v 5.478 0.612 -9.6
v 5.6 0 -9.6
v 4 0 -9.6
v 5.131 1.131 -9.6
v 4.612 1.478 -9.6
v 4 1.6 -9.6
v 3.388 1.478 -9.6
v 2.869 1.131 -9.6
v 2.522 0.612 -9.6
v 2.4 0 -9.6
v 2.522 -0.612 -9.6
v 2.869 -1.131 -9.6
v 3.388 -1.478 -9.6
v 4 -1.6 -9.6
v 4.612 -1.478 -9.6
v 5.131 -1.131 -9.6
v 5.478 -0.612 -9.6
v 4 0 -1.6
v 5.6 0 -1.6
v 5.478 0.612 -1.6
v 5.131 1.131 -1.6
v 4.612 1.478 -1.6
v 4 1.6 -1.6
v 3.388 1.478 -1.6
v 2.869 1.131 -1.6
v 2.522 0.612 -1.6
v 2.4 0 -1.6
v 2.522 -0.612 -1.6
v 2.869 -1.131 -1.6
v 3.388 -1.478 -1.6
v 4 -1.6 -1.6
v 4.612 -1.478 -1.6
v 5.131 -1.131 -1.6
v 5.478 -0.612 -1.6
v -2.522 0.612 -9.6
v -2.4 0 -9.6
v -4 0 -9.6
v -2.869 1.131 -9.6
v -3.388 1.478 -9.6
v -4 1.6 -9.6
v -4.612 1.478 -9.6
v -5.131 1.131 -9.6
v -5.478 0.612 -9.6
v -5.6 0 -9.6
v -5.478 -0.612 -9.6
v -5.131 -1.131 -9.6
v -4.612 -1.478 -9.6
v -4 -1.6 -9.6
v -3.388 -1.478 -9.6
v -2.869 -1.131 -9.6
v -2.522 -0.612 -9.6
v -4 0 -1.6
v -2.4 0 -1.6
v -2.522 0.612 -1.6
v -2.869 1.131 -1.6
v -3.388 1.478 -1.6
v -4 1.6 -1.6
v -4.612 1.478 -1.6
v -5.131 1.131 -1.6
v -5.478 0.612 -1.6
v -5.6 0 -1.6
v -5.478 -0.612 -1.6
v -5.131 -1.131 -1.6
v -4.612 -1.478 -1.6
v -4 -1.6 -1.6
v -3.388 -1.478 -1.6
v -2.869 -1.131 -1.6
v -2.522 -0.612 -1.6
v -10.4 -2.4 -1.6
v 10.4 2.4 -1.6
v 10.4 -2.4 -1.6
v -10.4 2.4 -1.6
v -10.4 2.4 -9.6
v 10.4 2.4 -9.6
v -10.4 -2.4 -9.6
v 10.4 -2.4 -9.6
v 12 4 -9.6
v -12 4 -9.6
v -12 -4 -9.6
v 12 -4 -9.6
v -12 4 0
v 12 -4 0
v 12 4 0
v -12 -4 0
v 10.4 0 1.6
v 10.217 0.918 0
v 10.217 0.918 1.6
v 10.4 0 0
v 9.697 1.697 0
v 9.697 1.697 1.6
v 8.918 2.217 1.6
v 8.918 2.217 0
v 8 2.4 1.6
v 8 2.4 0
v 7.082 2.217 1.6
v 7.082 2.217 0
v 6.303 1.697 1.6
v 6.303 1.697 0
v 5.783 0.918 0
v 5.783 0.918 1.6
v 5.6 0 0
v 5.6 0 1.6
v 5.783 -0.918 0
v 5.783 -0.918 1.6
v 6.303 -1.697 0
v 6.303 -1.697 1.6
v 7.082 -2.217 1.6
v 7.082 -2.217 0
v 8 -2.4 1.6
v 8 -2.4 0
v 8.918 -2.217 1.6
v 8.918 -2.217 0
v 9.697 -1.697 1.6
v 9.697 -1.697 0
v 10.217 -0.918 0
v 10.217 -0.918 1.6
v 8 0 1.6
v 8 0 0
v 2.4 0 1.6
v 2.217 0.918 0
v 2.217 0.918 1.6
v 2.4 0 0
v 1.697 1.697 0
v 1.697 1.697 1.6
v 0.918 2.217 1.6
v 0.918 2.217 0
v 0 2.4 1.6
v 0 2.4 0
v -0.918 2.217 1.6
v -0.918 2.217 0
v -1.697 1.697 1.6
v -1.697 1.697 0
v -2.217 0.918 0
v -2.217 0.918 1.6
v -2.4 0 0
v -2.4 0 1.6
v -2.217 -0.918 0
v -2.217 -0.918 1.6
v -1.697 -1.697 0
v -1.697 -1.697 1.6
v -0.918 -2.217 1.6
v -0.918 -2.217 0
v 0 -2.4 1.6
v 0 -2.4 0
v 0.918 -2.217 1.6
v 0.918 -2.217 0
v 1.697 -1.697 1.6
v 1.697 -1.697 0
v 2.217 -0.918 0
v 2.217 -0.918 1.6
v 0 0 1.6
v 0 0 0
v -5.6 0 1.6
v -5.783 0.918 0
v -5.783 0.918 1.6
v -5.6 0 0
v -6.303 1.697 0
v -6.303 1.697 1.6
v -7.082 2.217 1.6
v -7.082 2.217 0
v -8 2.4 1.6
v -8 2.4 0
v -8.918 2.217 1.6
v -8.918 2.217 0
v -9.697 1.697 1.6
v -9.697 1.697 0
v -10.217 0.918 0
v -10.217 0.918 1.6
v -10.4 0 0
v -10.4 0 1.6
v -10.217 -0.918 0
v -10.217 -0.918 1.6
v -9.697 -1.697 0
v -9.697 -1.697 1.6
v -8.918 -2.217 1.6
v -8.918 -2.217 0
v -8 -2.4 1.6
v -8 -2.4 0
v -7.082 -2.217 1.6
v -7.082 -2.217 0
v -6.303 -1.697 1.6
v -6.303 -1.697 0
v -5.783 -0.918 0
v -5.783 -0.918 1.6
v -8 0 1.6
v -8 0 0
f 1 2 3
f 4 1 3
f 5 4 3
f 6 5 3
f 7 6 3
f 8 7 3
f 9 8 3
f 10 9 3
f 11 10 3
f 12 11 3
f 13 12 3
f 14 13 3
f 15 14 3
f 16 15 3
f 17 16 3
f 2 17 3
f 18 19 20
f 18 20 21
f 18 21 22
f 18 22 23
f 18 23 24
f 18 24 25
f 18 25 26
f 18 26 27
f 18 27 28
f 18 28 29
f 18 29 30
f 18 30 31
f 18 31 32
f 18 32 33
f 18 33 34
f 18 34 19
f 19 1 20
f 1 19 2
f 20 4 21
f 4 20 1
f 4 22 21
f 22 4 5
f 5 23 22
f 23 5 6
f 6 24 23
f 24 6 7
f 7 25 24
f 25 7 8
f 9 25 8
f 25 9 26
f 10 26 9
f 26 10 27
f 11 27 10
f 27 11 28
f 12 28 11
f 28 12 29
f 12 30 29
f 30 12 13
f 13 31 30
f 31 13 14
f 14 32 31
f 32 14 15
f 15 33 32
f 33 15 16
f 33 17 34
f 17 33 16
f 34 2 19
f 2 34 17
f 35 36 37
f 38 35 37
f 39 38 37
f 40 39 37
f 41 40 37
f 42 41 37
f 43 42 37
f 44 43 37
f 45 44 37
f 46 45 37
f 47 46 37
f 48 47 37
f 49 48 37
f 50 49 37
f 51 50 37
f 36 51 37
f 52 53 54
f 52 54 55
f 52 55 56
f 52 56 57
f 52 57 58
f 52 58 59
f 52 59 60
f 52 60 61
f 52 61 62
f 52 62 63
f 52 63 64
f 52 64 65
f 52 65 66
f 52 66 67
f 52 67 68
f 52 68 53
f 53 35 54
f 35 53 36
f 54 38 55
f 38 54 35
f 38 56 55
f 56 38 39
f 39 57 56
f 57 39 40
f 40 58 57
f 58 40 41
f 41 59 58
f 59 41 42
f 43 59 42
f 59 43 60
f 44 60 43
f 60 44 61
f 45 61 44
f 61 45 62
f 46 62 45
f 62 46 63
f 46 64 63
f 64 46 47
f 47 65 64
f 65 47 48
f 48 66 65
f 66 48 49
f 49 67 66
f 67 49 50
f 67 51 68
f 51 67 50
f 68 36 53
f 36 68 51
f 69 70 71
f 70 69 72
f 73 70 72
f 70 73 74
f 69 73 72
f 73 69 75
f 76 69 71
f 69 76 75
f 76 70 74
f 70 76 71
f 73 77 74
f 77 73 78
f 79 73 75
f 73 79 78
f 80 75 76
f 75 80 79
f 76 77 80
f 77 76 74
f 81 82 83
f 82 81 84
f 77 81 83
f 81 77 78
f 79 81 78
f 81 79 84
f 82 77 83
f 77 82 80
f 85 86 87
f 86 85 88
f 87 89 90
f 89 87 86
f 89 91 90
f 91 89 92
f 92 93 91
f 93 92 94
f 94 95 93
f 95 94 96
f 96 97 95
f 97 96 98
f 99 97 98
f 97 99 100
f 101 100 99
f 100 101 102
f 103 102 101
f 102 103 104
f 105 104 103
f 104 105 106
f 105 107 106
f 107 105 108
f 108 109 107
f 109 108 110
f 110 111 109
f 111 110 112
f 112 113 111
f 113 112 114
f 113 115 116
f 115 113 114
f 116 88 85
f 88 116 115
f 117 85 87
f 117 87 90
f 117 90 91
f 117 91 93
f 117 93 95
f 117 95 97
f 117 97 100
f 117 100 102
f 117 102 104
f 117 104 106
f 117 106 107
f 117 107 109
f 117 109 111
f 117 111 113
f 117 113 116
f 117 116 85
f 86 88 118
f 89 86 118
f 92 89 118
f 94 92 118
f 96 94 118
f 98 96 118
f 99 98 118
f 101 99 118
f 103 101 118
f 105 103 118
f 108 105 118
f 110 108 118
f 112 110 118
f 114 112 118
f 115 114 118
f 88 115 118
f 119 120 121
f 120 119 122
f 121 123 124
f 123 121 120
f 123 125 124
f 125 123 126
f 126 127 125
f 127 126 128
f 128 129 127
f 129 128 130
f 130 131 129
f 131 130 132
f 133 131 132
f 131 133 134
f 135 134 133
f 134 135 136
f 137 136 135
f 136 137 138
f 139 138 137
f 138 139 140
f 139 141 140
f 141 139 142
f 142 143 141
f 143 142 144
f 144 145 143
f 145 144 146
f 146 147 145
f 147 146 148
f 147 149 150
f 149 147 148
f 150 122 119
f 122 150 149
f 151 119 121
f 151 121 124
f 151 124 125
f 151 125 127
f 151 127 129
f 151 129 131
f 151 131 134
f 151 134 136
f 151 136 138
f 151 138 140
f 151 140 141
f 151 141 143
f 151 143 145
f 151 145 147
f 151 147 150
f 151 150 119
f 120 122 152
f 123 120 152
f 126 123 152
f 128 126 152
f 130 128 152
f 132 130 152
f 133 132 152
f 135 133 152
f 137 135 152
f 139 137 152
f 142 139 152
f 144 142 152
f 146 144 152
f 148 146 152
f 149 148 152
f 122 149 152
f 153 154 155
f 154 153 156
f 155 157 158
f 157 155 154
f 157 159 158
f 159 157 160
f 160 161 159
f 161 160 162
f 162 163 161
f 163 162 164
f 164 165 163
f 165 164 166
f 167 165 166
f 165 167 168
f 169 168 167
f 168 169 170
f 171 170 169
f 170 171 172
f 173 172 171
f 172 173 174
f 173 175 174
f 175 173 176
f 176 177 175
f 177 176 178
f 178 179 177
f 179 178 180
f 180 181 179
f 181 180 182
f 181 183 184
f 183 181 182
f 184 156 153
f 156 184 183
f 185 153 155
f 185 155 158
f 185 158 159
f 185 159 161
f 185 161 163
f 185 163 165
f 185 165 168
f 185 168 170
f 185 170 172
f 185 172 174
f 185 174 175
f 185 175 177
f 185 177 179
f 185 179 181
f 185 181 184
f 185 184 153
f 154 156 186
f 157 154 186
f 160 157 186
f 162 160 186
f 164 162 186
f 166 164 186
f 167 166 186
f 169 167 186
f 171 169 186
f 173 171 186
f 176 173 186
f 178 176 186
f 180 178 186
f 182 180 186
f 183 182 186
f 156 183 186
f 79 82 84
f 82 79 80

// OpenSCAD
// file: ../p/4-4edge.scad
use <../lib.scad>
function ldraw_lib__4_4edge() = [
// 0 Circle 1.0
// 0 Name: 4-4edge.dat
// 0 Author: James Jessiman
// 0 !LDRAW_ORG Primitive UPDATE 2017-01
// 0 !LICENSE Licensed under CC BY 2.0 and CC BY 4.0 : see CAreadme.txt
// 
// 0 BFC CERTIFY CCW
  [0,"BFC","CERTIFY"],
  [0,"BFC","CCW"],
// 
// 0 !HISTORY 1998-12-15 [PTadmin] Official Update 1998-10
// 0 !HISTORY 2005-12-28 [PTadmin] Official Update 2005-01
// 0 !HISTORY 2007-06-24 [PTadmin] Header formatted for Contributor Agreement
// 0 !HISTORY 2008-07-01 [PTadmin] Official Update 2008-01
// 0 !HISTORY 2017-01-15 [Steffen] BFCed
// 0 !HISTORY 2017-12-30 [PTadmin] Official Update 2017-01
// 
// 
// 2 24 1 0 0 0.9239 0 0.3827
  [2,24,1,0,0,0.9239,0,0.3827],
// 2 24 0.9239 0 0.3827 0.7071 0 0.7071
  [2,24,0.9239,0,0.3827,0.7071,0,0.7071],
// 2 24 0.7071 0 0.7071 0.3827 0 0.9239
  [2,24,0.7071,0,0.7071,0.3827,0,0.9239],
// 2 24 0.3827 0 0.9239 0 0 1
  [2,24,0.3827,0,0.9239,0,0,1],
// 2 24 0 0 1 -0.3827 0 0.9239
  [2,24,0,0,1,-0.3827,0,0.9239],
// 2 24 -0.3827 0 0.9239 -0.7071 0 0.7071
  [2,24,-0.3827,0,0.9239,-0.7071,0,0.7071],
// 2 24 -0.7071 0 0.7071 -0.9239 0 0.3827
  [2,24,-0.7071,0,0.7071,-0.9239,0,0.3827],
// 2 24 -0.9239 0 0.3827 -1 0 -0
  [2,24,-0.9239,0,0.3827,-1,0,-0],
// 2 24 -1 0 -0 -0.9239 0 -0.3827
  [2,24,-1,0,-0,-0.9239,0,-0.3827],
// 2 24 -0.9239 0 -0.3827 -0.7071 0 -0.7071
  [2,24,-0.9239,0,-0.3827,-0.7071,0,-0.7071],
// 2 24 -0.7071 0 -0.7071 -0.3827 0 -0.9239
  [2,24,-0.7071,0,-0.7071,-0.3827,0,-0.9239],
// 2 24 -0.3827 0 -0.9239 0 0 -1
  [2,24,-0.3827,0,-0.9239,0,0,-1],
// 2 24 0 0 -1 0.3827 0 -0.9239
  [2,24,0,0,-1,0.3827,0,-0.9239],
// 2 24 0.3827 0 -0.9239 0.7071 0 -0.7071
  [2,24,0.3827,0,-0.9239,0.7071,0,-0.7071],
// 2 24 0.7071 0 -0.7071 0.9239 0 -0.3827
  [2,24,0.7071,0,-0.7071,0.9239,0,-0.3827],
// 2 24 0.9239 0 -0.3827 1 0 0
  [2,24,0.9239,0,-0.3827,1,0,0],
];
module ldraw_lib__4_4edge(step=0, col=false, unit=2/5, alt=false, line=0.2, solid=!$preview)
    makepoly(ldraw_lib__4_4edge(), step=step, col=col, unit=unit, alt=alt, line=line, solid=solid);
ldraw_lib__4_4edge(line=0.2);
// file: ../p/4-4disc.scad
use <../lib.scad>
function ldraw_lib__4_4disc() = [
// 0 Disc 1.0
// 0 Name: 4-4disc.dat
// 0 Author: James Jessiman
// 0 !LDRAW_ORG Primitive UPDATE 2002-02
// 0 !LICENSE Licensed under CC BY 2.0 and CC BY 4.0 : see CAreadme.txt
// 
// 0 BFC CERTIFY CCW
  [0,"BFC","CERTIFY"],
  [0,"BFC","CCW"],
// 
// 0 !HISTORY 1998-12-15 [PTadmin] Official Update 1998-10
// 0 !HISTORY 2002-03-23 [sbliss] Added BFC statement
// 0 !HISTORY 2002-04-25 [PTadmin] Official Update 2002-02
// 0 !HISTORY 2007-06-24 [PTadmin] Header formatted for Contributor Agreement
// 0 !HISTORY 2008-07-01 [PTadmin] Official Update 2008-01
// 
// 
// 3 16 0 0 0 1 0 0 0.9239 0 0.3827
  [3,16,0,0,0,1,0,0,0.9239,0,0.3827],
// 3 16 0 0 0 0.9239 0 0.3827 0.7071 0 0.7071
  [3,16,0,0,0,0.9239,0,0.3827,0.7071,0,0.7071],
// 3 16 0 0 0 0.7071 0 0.7071 0.3827 0 0.9239
  [3,16,0,0,0,0.7071,0,0.7071,0.3827,0,0.9239],
// 3 16 0 0 0 0.3827 0 0.9239 0 0 1
  [3,16,0,0,0,0.3827,0,0.9239,0,0,1],
// 3 16 0 0 0 0 0 1 -0.3827 0 0.9239
  [3,16,0,0,0,0,0,1,-0.3827,0,0.9239],
// 3 16 0 0 0 -0.3827 0 0.9239 -0.7071 0 0.7071
  [3,16,0,0,0,-0.3827,0,0.9239,-0.7071,0,0.7071],
// 3 16 0 0 0 -0.7071 0 0.7071 -0.9239 0 0.3827
  [3,16,0,0,0,-0.7071,0,0.7071,-0.9239,0,0.3827],
// 3 16 0 0 0 -0.9239 0 0.3827 -1 0 -0
  [3,16,0,0,0,-0.9239,0,0.3827,-1,0,-0],
// 3 16 0 0 0 -1 0 -0 -0.9239 0 -0.3827
  [3,16,0,0,0,-1,0,-0,-0.9239,0,-0.3827],
// 3 16 0 0 0 -0.9239 0 -0.3827 -0.7071 0 -0.7071
  [3,16,0,0,0,-0.9239,0,-0.3827,-0.7071,0,-0.7071],
// 3 16 0 0 0 -0.7071 0 -0.7071 -0.3827 0 -0.9239
  [3,16,0,0,0,-0.7071,0,-0.7071,-0.3827,0,-0.9239],
// 3 16 0 0 0 -0.3827 0 -0.9239 0 0 -1
  [3,16,0,0,0,-0.3827,0,-0.9239,0,0,-1],
// 3 16 0 0 0 0 0 -1 0.3827 0 -0.9239
  [3,16,0,0,0,0,0,-1,0.3827,0,-0.9239],
// 3 16 0 0 0 0.3827 0 -0.9239 0.7071 0 -0.7071
  [3,16,0,0,0,0.3827,0,-0.9239,0.7071,0,-0.7071],
// 3 16 0 0 0 0.7071 0 -0.7071 0.9239 0 -0.3827
  [3,16,0,0,0,0.7071,0,-0.7071,0.9239,0,-0.3827],
// 3 16 0 0 0 0.9239 0 -0.3827 1 0 0
  [3,16,0,0,0,0.9239,0,-0.3827,1,0,0],
// 0
];
module ldraw_lib__4_4disc(step=0, col=false, unit=2/5, alt=false, line=0.2, solid=!$preview)
    makepoly(ldraw_lib__4_4disc(), step=step, col=col, unit=unit, alt=alt, line=line, solid=solid);
ldraw_lib__4_4disc(line=0.2);
// file: ../p/4-4cyli.scad
use <../lib.scad>
$fa=1; $fs=0.2;
function ldraw_lib__4_4cyli(realsolid=false) = [
// 0 Cylinder 1.0
// 0 Name: 4-4cyli.dat
// 0 Author: James Jessiman
// 0 !LDRAW_ORG Primitive UPDATE 2005-01
// 0 !LICENSE Licensed under CC BY 2.0 and CC BY 4.0 : see CAreadme.txt
// 
// 0 BFC CERTIFY CCW
  [0,"BFC","CERTIFY"],
  [0,"BFC","CCW"],
// 
// 0 !HISTORY 1998-12-15 [PTadmin] Official Update 1998-10
// 0 !HISTORY 2002-03-23 [sbliss] Added BFC statement; merged headers from files in distributions LDraw 0.27 and Complete.
// 0 !HISTORY 2002-04-25 [PTadmin] Official Update 2002-02
// 0 !HISTORY 2004-12-14 [guyvivan] BFC CCW
// 0 !HISTORY 2005-12-28 [PTadmin] Official Update 2005-01
// 0 !HISTORY 2007-06-24 [PTadmin] Header formatted for Contributor Agreement
// 0 !HISTORY 2008-07-01 [PTadmin] Official Update 2008-01
// 
// 
// 4 16 1 1 0 0.9239 1 0.3827 0.9239 0 0.3827 1 0 0
  [4,16,1,1,0,0.9239,1,0.3827,0.9239,0,0.3827,1,0,0],
// 5 24 1 0 0 1 1 0 0.9239 0 0.3827 0.9239 0 -0.3827
  [5,24,1,0,0,1,1,0,0.9239,0,0.3827,0.9239,0,-0.3827],
// 4 16 0.9239 1 0.3827 0.7071 1 0.7071 0.7071 0 0.7071 0.9239 0 0.3827
  [4,16,0.9239,1,0.3827,0.7071,1,0.7071,0.7071,0,0.7071,0.9239,0,0.3827],
// 5 24 0.9239 0 0.3827 0.9239 1 0.3827 0.7071 0 0.7071 1 0 0
  [5,24,0.9239,0,0.3827,0.9239,1,0.3827,0.7071,0,0.7071,1,0,0],
// 4 16 0.7071 1 0.7071 0.3827 1 0.9239 0.3827 0 0.9239 0.7071 0 0.7071
  [4,16,0.7071,1,0.7071,0.3827,1,0.9239,0.3827,0,0.9239,0.7071,0,0.7071],
// 5 24 0.7071 0 0.7071 0.7071 1 0.7071 0.3827 0 0.9239 0.9239 0 0.3827
  [5,24,0.7071,0,0.7071,0.7071,1,0.7071,0.3827,0,0.9239,0.9239,0,0.3827],
// 4 16 0.3827 1 0.9239 0 1 1 0 0 1 0.3827 0 0.9239
  [4,16,0.3827,1,0.9239,0,1,1,0,0,1,0.3827,0,0.9239],
// 5 24 0.3827 0 0.9239 0.3827 1 0.9239 0 0 1 0.7071 0 0.7071
  [5,24,0.3827,0,0.9239,0.3827,1,0.9239,0,0,1,0.7071,0,0.7071],
// 4 16 0 1 1 -0.3827 1 0.9239 -0.3827 0 0.9239 0 0 1
  [4,16,0,1,1,-0.3827,1,0.9239,-0.3827,0,0.9239,0,0,1],
// 5 24 0 0 1 0 1 1 -0.3827 0 0.9239 0.3827 0 0.9239
  [5,24,0,0,1,0,1,1,-0.3827,0,0.9239,0.3827,0,0.9239],
// 4 16 -0.3827 1 0.9239 -0.7071 1 0.7071 -0.7071 0 0.7071 -0.3827 0 0.9239
  [4,16,-0.3827,1,0.9239,-0.7071,1,0.7071,-0.7071,0,0.7071,-0.3827,0,0.9239],
// 5 24 -0.3827 0 0.9239 -0.3827 1 0.9239 -0.7071 0 0.7071 0 0 1
  [5,24,-0.3827,0,0.9239,-0.3827,1,0.9239,-0.7071,0,0.7071,0,0,1],
// 4 16 -0.7071 1 0.7071 -0.9239 1 0.3827 -0.9239 0 0.3827 -0.7071 0 0.7071
  [4,16,-0.7071,1,0.7071,-0.9239,1,0.3827,-0.9239,0,0.3827,-0.7071,0,0.7071],
// 5 24 -0.7071 0 0.7071 -0.7071 1 0.7071 -0.9239 0 0.3827 -0.3827 0 0.9239
  [5,24,-0.7071,0,0.7071,-0.7071,1,0.7071,-0.9239,0,0.3827,-0.3827,0,0.9239],
// 4 16 -0.9239 1 0.3827 -1 1 0 -1 0 0 -0.9239 0 0.3827
  [4,16,-0.9239,1,0.3827,-1,1,0,-1,0,0,-0.9239,0,0.3827],
// 5 24 -0.9239 0 0.3827 -0.9239 1 0.3827 -1 0 0 -0.7071 0 0.7071
  [5,24,-0.9239,0,0.3827,-0.9239,1,0.3827,-1,0,0,-0.7071,0,0.7071],
// 4 16 -1 1 0 -0.9239 1 -0.3827 -0.9239 0 -0.3827 -1 0 0
  [4,16,-1,1,0,-0.9239,1,-0.3827,-0.9239,0,-0.3827,-1,0,0],
// 5 24 -1 0 0 -1 1 0 -0.9239 0 -0.3827 -0.9239 0 0.3827
  [5,24,-1,0,0,-1,1,0,-0.9239,0,-0.3827,-0.9239,0,0.3827],
// 4 16 -0.9239 1 -0.3827 -0.7071 1 -0.7071 -0.7071 0 -0.7071 -0.9239 0 -0.3827
  [4,16,-0.9239,1,-0.3827,-0.7071,1,-0.7071,-0.7071,0,-0.7071,-0.9239,0,-0.3827],
// 5 24 -0.9239 0 -0.3827 -0.9239 1 -0.3827 -0.7071 0 -0.7071 -1 0 0
  [5,24,-0.9239,0,-0.3827,-0.9239,1,-0.3827,-0.7071,0,-0.7071,-1,0,0],
// 4 16 -0.7071 1 -0.7071 -0.3827 1 -0.9239 -0.3827 0 -0.9239 -0.7071 0 -0.7071
  [4,16,-0.7071,1,-0.7071,-0.3827,1,-0.9239,-0.3827,0,-0.9239,-0.7071,0,-0.7071],
// 5 24 -0.7071 0 -0.7071 -0.7071 1 -0.7071 -0.3827 0 -0.9239 -0.9239 0 -0.3827
  [5,24,-0.7071,0,-0.7071,-0.7071,1,-0.7071,-0.3827,0,-0.9239,-0.9239,0,-0.3827],
// 4 16 -0.3827 1 -0.9239 0 1 -1 0 0 -1 -0.3827 0 -0.9239
  [4,16,-0.3827,1,-0.9239,0,1,-1,0,0,-1,-0.3827,0,-0.9239],
// 5 24 -0.3827 0 -0.9239 -0.3827 1 -0.9239 0 0 -1 -0.7071 0 -0.7071
  [5,24,-0.3827,0,-0.9239,-0.3827,1,-0.9239,0,0,-1,-0.7071,0,-0.7071],
// 4 16 0 1 -1 0.3827 1 -0.9239 0.3827 0 -0.9239 0 0 -1
  [4,16,0,1,-1,0.3827,1,-0.9239,0.3827,0,-0.9239,0,0,-1],
// 5 24 0 0 -1 0 1 -1 0.3827 0 -0.9239 -0.3827 0 -0.9239
  [5,24,0,0,-1,0,1,-1,0.3827,0,-0.9239,-0.3827,0,-0.9239],
// 4 16 0.3827 1 -0.9239 0.7071 1 -0.7071 0.7071 0 -0.7071 0.3827 0 -0.9239
  [4,16,0.3827,1,-0.9239,0.7071,1,-0.7071,0.7071,0,-0.7071,0.3827,0,-0.9239],
// 5 24 0.3827 0 -0.9239 0.3827 1 -0.9239 0.7071 0 -0.7071 0 0 -1
  [5,24,0.3827,0,-0.9239,0.3827,1,-0.9239,0.7071,0,-0.7071,0,0,-1],
// 4 16 0.7071 1 -0.7071 0.9239 1 -0.3827 0.9239 0 -0.3827 0.7071 0 -0.7071
  [4,16,0.7071,1,-0.7071,0.9239,1,-0.3827,0.9239,0,-0.3827,0.7071,0,-0.7071],
// 5 24 0.7071 0 -0.7071 0.7071 1 -0.7071 0.9239 0 -0.3827 0.3827 0 -0.9239
  [5,24,0.7071,0,-0.7071,0.7071,1,-0.7071,0.9239,0,-0.3827,0.3827,0,-0.9239],
// 4 16 0.9239 1 -0.3827 1 1 0 1 0 0 0.9239 0 -0.3827
  [4,16,0.9239,1,-0.3827,1,1,0,1,0,0,0.9239,0,-0.3827],
// 5 24 0.9239 0 -0.3827 0.9239 1 -0.3827 1 0 0 0.7071 0 -0.7071
  [5,24,0.9239,0,-0.3827,0.9239,1,-0.3827,1,0,0,0.7071,0,-0.7071],
// 0
];
module ldraw_lib__4_4cyli(step=0, col=false, unit=2/5, alt=false, line=0.2, solid=!$preview)
    makepoly(ldraw_lib__4_4cyli(solid), step=step, col=col, unit=unit, alt=alt, line=line, solid=solid);
ldraw_lib__4_4cyli(line=0.2);
// file: ../p/stud3.scad
use <../lib.scad>
use <4-4cyli.scad>
use <4-4disc.scad>
use <4-4edge.scad>
function ldraw_lib__stud3() = [
// 0 Stud Tube Solid
// 0 Name: stud3.dat
// 0 Author: James Jessiman
// 0 !LDRAW_ORG Primitive UPDATE 2012-01
// 0 !LICENSE Licensed under CC BY 4.0 : see CAreadme.txt
// 
// 0 BFC CERTIFY CCW
  [0,"BFC","CERTIFY"],
  [0,"BFC","CCW"],
// 
// 0 !HISTORY 2002-04-04 [sbliss] Modified for BFC compliance
// 0 !HISTORY 2002-04-25 [PTadmin] Official Update 2002-02
// 0 !HISTORY 2007-06-24 [PTadmin] Header formatted for Contributor Agreement
// 0 !HISTORY 2008-07-01 [PTadmin] Official Update 2008-01
// 0 !HISTORY 2012-02-16 [Philo] Changed to CCW
// 0 !HISTORY 2012-03-30 [PTadmin] Official Update 2012-01
// 
// 
// 1 16 0 -4 0 4 0 0 0 1 0 0 0 4 4-4edge.dat
  [1,16,0,-4,0,4,0,0,0,1,0,0,0,4, ldraw_lib__4_4edge()],
// 1 16 0 0 0 4 0 0 0 1 0 0 0 4 4-4edge.dat
  [1,16,0,0,0,4,0,0,0,1,0,0,0,4, ldraw_lib__4_4edge()],
// 1 16 0 -4 0 4 0 0 0 1 0 0 0 4 4-4disc.dat
  [1,16,0,-4,0,4,0,0,0,1,0,0,0,4, ldraw_lib__4_4disc()],
  [-1,16,0,0,0,4,0,0,0,-1,0,0,0,4, ldraw_lib__4_4disc()],
// 1 16 0 -4 0 4 0 0 0 4 0 0 0 4 4-4cyli.dat
  [1,16,0,-4,0,4,0,0,0,4,0,0,0,4, ldraw_lib__4_4cyli()],
];
module ldraw_lib__stud3(step=0, col=false, unit=2/5, alt=false, line=0.2, solid=!$preview)
    makepoly(ldraw_lib__stud3(), step=step, col=col, unit=unit, alt=alt, line=line, solid=solid);
ldraw_lib__stud3(line=0.2);
// file: ../p/stud.scad
use <../lib.scad>
use <4-4cyli.scad>
use <4-4disc.scad>
use <4-4edge.scad>
function ldraw_lib__stud() = [
// 0 Stud
// 0 Name: stud.dat
// 0 Author: James Jessiman
// 0 !LDRAW_ORG Primitive UPDATE 2012-01
// 0 !LICENSE Licensed under CC BY 4.0 : see CAreadme.txt
// 
// 0 BFC CERTIFY CCW
  [0,"BFC","CERTIFY"],
  [0,"BFC","CCW"],
// 
// 0 !HISTORY 2002-04-04 [sbliss] Modified for BFC compliance
// 0 !HISTORY 2002-04-25 [PTadmin] Official Update 2002-02
// 0 !HISTORY 2007-06-24 [PTadmin] Header formatted for Contributor Agreement
// 0 !HISTORY 2008-07-01 [PTadmin] Official Update 2008-01
// 0 !HISTORY 2012-02-16 [Philo] Changed to CCW
// 0 !HISTORY 2012-03-30 [PTadmin] Official Update 2012-01
// 
// 
// 1 16 0 0 0 6 0 0 0 1 0 0 0 6 4-4edge.dat
  [1,16,0,0,0,6,0,0,0,1,0,0,0,6, ldraw_lib__4_4edge()],
// 1 16 0 -4 0 6 0 0 0 1 0 0 0 6 4-4edge.dat
  [1,16,0,-4,0,6,0,0,0,1,0,0,0,6, ldraw_lib__4_4edge()],
// 1 16 0 0 0 6 0 0 0 -4 0 0 0 6 4-4cyli.dat
  [1,16,0,0,0,6,0,0,0,-4,0,0,0,6, ldraw_lib__4_4cyli()],
// 1 16 0 -4 0 6 0 0 0 1 0 0 0 6 4-4disc.dat
  [1,16,0,-4,0,6,0,0,0,1,0,0,0,6, ldraw_lib__4_4disc()],
  [-1,16,0,0,0,6,0,0,0,-1,0,0,0,6, ldraw_lib__4_4disc()],
];
module ldraw_lib__stud(step=0, col=false, unit=2/5, alt=false, line=0.2, solid=!$preview)
    makepoly(ldraw_lib__stud(), step=step, col=col, unit=unit, alt=alt, line=line, solid=solid);
ldraw_lib__stud(line=0.2);
// file: ../p/box5.scad
use <../lib.scad>
function ldraw_lib__box5() = [
// 0 Box with 5 Faces and All Edges
// 0 Name: box5.dat
// 0 Author: James Jessiman
// 0 !LDRAW_ORG Primitive UPDATE 2012-01
// 0 !LICENSE Licensed under CC BY 2.0 and CC BY 4.0 : see CAreadme.txt
// 
// 0 BFC CERTIFY CCW
  [0,"BFC","CERTIFY"],
  [0,"BFC","CCW"],
// 
// 0 !HISTORY 2002-04-03 [sbliss] Modified for BFC compliance
// 0 !HISTORY 2002-04-25 [PTadmin] Official Update 2002-02
// 0 !HISTORY 2007-06-24 [PTadmin] Header formatted for Contributor Agreement
// 0 !HISTORY 2008-07-01 [PTadmin] Official Update 2008-01
// 0 !HISTORY 2012-02-16 [Philo] Changed to CCW
// 0 !HISTORY 2012-03-30 [PTadmin] Official Update 2012-01
// 
// 
// 2 24 1 1 1 -1 1 1
  [2,24,1,1,1,-1,1,1],
// 2 24 -1 1 1 -1 1 -1
  [2,24,-1,1,1,-1,1,-1],
// 2 24 -1 1 -1 1 1 -1
  [2,24,-1,1,-1,1,1,-1],
// 2 24 1 1 -1 1 1 1
  [2,24,1,1,-1,1,1,1],
// 2 24 1 0 1 -1 0 1
  [2,24,1,0,1,-1,0,1],
// 2 24 -1 0 1 -1 0 -1
  [2,24,-1,0,1,-1,0,-1],
// 2 24 -1 0 -1 1 0 -1
  [2,24,-1,0,-1,1,0,-1],
// 2 24 1 0 -1 1 0 1
  [2,24,1,0,-1,1,0,1],
// 2 24 1 0 1 1 1 1
  [2,24,1,0,1,1,1,1],
// 2 24 -1 0 1 -1 1 1
  [2,24,-1,0,1,-1,1,1],
// 2 24 1 0 -1 1 1 -1
  [2,24,1,0,-1,1,1,-1],
// 2 24 -1 0 -1 -1 1 -1
  [2,24,-1,0,-1,-1,1,-1],
// 4 16 -1 1 1 1 1 1 1 1 -1 -1 1 -1
  [4,16,-1,1,1,1,1,1,1,1,-1,-1,1,-1],
// 4 16 -1 1 1 -1 0 1 1 0 1 1 1 1
  [4,16,-1,1,1,-1,0,1,1,0,1,1,1,1],
// 4 16 -1 1 -1 -1 0 -1 -1 0 1 -1 1 1
  [4,16,-1,1,-1,-1,0,-1,-1,0,1,-1,1,1],
// 4 16 1 1 -1 1 0 -1 -1 0 -1 -1 1 -1
  [4,16,1,1,-1,1,0,-1,-1,0,-1,-1,1,-1],
// 4 16 1 1 1 1 0 1 1 0 -1 1 1 -1
  [4,16,1,1,1,1,0,1,1,0,-1,1,1,-1],
];
makepoly(ldraw_lib__box5(), line=0.2);
// file: ../p/box4t.scad
use <../lib.scad>
function ldraw_lib__box4t() = [
// 0 Box with 4 Adjacent Faces and All Edges
// 0 Name: box4t.dat
// 0 Author: Tore Eriksson [Tore_Eriksson]
// 0 !LDRAW_ORG Primitive UPDATE 2003-02
// 0 !LICENSE Licensed under CC BY 2.0 and CC BY 4.0 : see CAreadme.txt
// 
// 0 BFC CERTIFY CCW
  [0,"BFC","CERTIFY"],
  [0,"BFC","CCW"],
// 
// 0 !HISTORY 1997-09-29 [PTadmin] Official Update 1997-15
// 0 !HISTORY 2002-08-31 [izanette] Modified with WINDZ for BFC compliance
// 0 !HISTORY 2003-08-01 [PTadmin] Official Update 2003-02
// 0 !HISTORY 2007-06-24 [PTadmin] Header formatted for Contributor Agreement
// 0 !HISTORY 2008-07-01 [PTadmin] Official Update 2008-01
// 
// 
// 2 24 1 1 1 -1 1 1
  [2,24,1,1,1,-1,1,1],
// 2 24 -1 1 1 -1 1 -1
  [2,24,-1,1,1,-1,1,-1],
// 2 24 -1 1 -1 1 1 -1
  [2,24,-1,1,-1,1,1,-1],
// 2 24 1 1 -1 1 1 1
  [2,24,1,1,-1,1,1,1],
// 2 24 1 0 1 -1 0 1
  [2,24,1,0,1,-1,0,1],
// 2 24 -1 0 1 -1 0 -1
  [2,24,-1,0,1,-1,0,-1],
// 2 24 -1 0 -1 1 0 -1
  [2,24,-1,0,-1,1,0,-1],
// 2 24 1 0 -1 1 0 1
  [2,24,1,0,-1,1,0,1],
// 2 24 1 0 1 1 1 1
  [2,24,1,0,1,1,1,1],
// 2 24 -1 0 1 -1 1 1
  [2,24,-1,0,1,-1,1,1],
// 2 24 1 0 -1 1 1 -1
  [2,24,1,0,-1,1,1,-1],
// 2 24 -1 0 -1 -1 1 -1
  [2,24,-1,0,-1,-1,1,-1],
// 4 16 1 1 1 1 1 -1 -1 1 -1 -1 1 1
  [4,16,1,1,1,1,1,-1,-1,1,-1,-1,1,1],
// 4 16 1 1 1 -1 1 1 -1 0 1 1 0 1
  [4,16,1,1,1,-1,1,1,-1,0,1,1,0,1],
// 4 16 -1 1 1 -1 1 -1 -1 0 -1 -1 0 1
  [4,16,-1,1,1,-1,1,-1,-1,0,-1,-1,0,1],
// 0 4 16 -1 1 -1 -1 0 -1 1 0 -1 1 1 -1
// 4 16 1 1 -1 1 1 1 1 0 1 1 0 -1
  [4,16,1,1,-1,1,1,1,1,0,1,1,0,-1],
// 0
];
makepoly(ldraw_lib__box4t(), line=0.2);
// file: s/3622s01.scad
use <../../lib.scad>
use <../../p/box4t.scad>
use <../../p/box5.scad>
use <../../p/stud.scad>
use <../../p/stud3.scad>
function ldraw_lib__s__3622s01() = [
// 0 ~Brick  1 x  3 without Front Face
// 0 Name: s\3622s01.dat
// 0 Author: Andy Westrate [westrate]
// 0 !LDRAW_ORG Subpart UPDATE 2004-02
// 0 !LICENSE Licensed under CC BY 2.0 and CC BY 4.0 : see CAreadme.txt
// 
// 0 BFC CERTIFY CCW
  [0,"BFC","CERTIFY"],
  [0,"BFC","CCW"],
// 
// 0 !HISTORY 2003-10-14 [westrate] Subfiled, BFC'd
// 0 !HISTORY 2004-04-22 [PTadmin] Official Update 2004-02
// 0 !HISTORY 2007-08-31 [PTadmin] Header formatted for Contributor Agreement
// 0 !HISTORY 2008-07-01 [PTadmin] Official Update 2008-01
// 
// 
// 0 // Uncomment the following for front face
// 0 // 4 16 30 0 -10 -30 0 -10 -30 24 -10 30 24 -10
// 1 16 10 4 0 1 0 0 0 -5 0 0 0 1 stud3.dat
  [1,16,10,4,0,1,0,0,0,-5,0,0,0,1, ldraw_lib__stud3()],
// 1 16 -10 4 0 1 0 0 0 -5 0 0 0 1 stud3.dat
  [1,16,-10,4,0,1,0,0,0,-5,0,0,0,1, ldraw_lib__stud3()],
// 
// 0 BFC INVERTNEXT
  [0,"BFC","INVERTNEXT"],
// 1 16 0 24 0 26 0 0 0 -20 0 0 0 6 box5.dat
  [1,16,0,24,0,26,0,0,0,-20,0,0,0,6, ldraw_lib__box5()],
// 
// 4 16 30 24 10 26 24 6 -26 24 6 -30 24 10
  [4,16,30,24,10,26,24,6,-26,24,6,-30,24,10],
// 4 16 -30 24 10 -26 24 6 -26 24 -6 -30 24 -10
  [4,16,-30,24,10,-26,24,6,-26,24,-6,-30,24,-10],
// 4 16 -30 24 -10 -26 24 -6 26 24 -6 30 24 -10
  [4,16,-30,24,-10,-26,24,-6,26,24,-6,30,24,-10],
// 4 16 30 24 -10 26 24 -6 26 24 6 30 24 10
  [4,16,30,24,-10,26,24,-6,26,24,6,30,24,10],
// 
// 1 16 0 24 0 30 0 0 0 -24 0 0 0 10 box4t.dat
  [1,16,0,24,0,30,0,0,0,-24,0,0,0,10, ldraw_lib__box4t()],
// 
// 1 16 20 0 0 1 0 0 0 1 0 0 0 1 stud.dat
  [1,16,20,0,0,1,0,0,0,1,0,0,0,1, ldraw_lib__stud()],
// 1 16 0 0 0 1 0 0 0 1 0 0 0 1 stud.dat
  [1,16,0,0,0,1,0,0,0,1,0,0,0,1, ldraw_lib__stud()],
// 1 16 -20 0 0 1 0 0 0 1 0 0 0 1 stud.dat
  [1,16,-20,0,0,1,0,0,0,1,0,0,0,1, ldraw_lib__stud()],
// 0
];
makepoly(ldraw_lib__s__3622s01(), line=0.2);
// main file
use <../lib.scad>
use <s/3622s01.scad>
function ldraw_lib__3622p06() = [
// 0 Brick  1 x  3 with Dog Face Wide Dark Orange Eyes, Medium Nougat Muzzle, Open Mouth Crooked Smile with 1 Tooth Pattern
// 0 Name: 3622p06.dat
// 0 Author: Chris Dee [cwdee]
// 0 !LDRAW_ORG Part UPDATE 2023-03
// 0 !LICENSE Licensed under CC BY 4.0 : see CAreadme.txt
// 
// 0 BFC CERTIFY CCW
  [0,"BFC","CERTIFY"],
  [0,"BFC","CCW"],
// 
// 0 !KEYWORDS Bricklink 3622pb096, Set 41452, Unikitty
// 
// 0 !HISTORY 2023-06-24 [OrionP] Official Update 2023-03
// 
// 
// 1 16 0 0 0 1 0 0 0 1 0 0 0 1 s\3622s01.dat
  [1,16,0,0,0,1,0,0,0,1,0,0,0,1, ldraw_lib__s__3622s01()],
// 
// 0 !TEXMAP START PLANAR -30 0 -10 30 0 -10 -30 24 -10 3622p06.png
// 0 !: 4 16 30 0 -10 -30 0 -10 -30 24 -10 30 24 -10
// 0 !TEXMAP FALLBACK
// 4 16 30 0 -10 -30 0 -10 -30 24 -10 30 24 -10
  [4,16,30,0,-10,-30,0,-10,-30,24,-10,30,24,-10],
// 0 !TEXMAP END
];
module ldraw_lib__3622p06(step=0, col=false, unit=2/5, alt=false, line=0.2, solid=!$preview)
    makepoly(ldraw_lib__3622p06(), step=step, col=col, unit=unit, alt=alt, line=line, solid=solid);
ldraw_lib__3622p06(line=0.2);
